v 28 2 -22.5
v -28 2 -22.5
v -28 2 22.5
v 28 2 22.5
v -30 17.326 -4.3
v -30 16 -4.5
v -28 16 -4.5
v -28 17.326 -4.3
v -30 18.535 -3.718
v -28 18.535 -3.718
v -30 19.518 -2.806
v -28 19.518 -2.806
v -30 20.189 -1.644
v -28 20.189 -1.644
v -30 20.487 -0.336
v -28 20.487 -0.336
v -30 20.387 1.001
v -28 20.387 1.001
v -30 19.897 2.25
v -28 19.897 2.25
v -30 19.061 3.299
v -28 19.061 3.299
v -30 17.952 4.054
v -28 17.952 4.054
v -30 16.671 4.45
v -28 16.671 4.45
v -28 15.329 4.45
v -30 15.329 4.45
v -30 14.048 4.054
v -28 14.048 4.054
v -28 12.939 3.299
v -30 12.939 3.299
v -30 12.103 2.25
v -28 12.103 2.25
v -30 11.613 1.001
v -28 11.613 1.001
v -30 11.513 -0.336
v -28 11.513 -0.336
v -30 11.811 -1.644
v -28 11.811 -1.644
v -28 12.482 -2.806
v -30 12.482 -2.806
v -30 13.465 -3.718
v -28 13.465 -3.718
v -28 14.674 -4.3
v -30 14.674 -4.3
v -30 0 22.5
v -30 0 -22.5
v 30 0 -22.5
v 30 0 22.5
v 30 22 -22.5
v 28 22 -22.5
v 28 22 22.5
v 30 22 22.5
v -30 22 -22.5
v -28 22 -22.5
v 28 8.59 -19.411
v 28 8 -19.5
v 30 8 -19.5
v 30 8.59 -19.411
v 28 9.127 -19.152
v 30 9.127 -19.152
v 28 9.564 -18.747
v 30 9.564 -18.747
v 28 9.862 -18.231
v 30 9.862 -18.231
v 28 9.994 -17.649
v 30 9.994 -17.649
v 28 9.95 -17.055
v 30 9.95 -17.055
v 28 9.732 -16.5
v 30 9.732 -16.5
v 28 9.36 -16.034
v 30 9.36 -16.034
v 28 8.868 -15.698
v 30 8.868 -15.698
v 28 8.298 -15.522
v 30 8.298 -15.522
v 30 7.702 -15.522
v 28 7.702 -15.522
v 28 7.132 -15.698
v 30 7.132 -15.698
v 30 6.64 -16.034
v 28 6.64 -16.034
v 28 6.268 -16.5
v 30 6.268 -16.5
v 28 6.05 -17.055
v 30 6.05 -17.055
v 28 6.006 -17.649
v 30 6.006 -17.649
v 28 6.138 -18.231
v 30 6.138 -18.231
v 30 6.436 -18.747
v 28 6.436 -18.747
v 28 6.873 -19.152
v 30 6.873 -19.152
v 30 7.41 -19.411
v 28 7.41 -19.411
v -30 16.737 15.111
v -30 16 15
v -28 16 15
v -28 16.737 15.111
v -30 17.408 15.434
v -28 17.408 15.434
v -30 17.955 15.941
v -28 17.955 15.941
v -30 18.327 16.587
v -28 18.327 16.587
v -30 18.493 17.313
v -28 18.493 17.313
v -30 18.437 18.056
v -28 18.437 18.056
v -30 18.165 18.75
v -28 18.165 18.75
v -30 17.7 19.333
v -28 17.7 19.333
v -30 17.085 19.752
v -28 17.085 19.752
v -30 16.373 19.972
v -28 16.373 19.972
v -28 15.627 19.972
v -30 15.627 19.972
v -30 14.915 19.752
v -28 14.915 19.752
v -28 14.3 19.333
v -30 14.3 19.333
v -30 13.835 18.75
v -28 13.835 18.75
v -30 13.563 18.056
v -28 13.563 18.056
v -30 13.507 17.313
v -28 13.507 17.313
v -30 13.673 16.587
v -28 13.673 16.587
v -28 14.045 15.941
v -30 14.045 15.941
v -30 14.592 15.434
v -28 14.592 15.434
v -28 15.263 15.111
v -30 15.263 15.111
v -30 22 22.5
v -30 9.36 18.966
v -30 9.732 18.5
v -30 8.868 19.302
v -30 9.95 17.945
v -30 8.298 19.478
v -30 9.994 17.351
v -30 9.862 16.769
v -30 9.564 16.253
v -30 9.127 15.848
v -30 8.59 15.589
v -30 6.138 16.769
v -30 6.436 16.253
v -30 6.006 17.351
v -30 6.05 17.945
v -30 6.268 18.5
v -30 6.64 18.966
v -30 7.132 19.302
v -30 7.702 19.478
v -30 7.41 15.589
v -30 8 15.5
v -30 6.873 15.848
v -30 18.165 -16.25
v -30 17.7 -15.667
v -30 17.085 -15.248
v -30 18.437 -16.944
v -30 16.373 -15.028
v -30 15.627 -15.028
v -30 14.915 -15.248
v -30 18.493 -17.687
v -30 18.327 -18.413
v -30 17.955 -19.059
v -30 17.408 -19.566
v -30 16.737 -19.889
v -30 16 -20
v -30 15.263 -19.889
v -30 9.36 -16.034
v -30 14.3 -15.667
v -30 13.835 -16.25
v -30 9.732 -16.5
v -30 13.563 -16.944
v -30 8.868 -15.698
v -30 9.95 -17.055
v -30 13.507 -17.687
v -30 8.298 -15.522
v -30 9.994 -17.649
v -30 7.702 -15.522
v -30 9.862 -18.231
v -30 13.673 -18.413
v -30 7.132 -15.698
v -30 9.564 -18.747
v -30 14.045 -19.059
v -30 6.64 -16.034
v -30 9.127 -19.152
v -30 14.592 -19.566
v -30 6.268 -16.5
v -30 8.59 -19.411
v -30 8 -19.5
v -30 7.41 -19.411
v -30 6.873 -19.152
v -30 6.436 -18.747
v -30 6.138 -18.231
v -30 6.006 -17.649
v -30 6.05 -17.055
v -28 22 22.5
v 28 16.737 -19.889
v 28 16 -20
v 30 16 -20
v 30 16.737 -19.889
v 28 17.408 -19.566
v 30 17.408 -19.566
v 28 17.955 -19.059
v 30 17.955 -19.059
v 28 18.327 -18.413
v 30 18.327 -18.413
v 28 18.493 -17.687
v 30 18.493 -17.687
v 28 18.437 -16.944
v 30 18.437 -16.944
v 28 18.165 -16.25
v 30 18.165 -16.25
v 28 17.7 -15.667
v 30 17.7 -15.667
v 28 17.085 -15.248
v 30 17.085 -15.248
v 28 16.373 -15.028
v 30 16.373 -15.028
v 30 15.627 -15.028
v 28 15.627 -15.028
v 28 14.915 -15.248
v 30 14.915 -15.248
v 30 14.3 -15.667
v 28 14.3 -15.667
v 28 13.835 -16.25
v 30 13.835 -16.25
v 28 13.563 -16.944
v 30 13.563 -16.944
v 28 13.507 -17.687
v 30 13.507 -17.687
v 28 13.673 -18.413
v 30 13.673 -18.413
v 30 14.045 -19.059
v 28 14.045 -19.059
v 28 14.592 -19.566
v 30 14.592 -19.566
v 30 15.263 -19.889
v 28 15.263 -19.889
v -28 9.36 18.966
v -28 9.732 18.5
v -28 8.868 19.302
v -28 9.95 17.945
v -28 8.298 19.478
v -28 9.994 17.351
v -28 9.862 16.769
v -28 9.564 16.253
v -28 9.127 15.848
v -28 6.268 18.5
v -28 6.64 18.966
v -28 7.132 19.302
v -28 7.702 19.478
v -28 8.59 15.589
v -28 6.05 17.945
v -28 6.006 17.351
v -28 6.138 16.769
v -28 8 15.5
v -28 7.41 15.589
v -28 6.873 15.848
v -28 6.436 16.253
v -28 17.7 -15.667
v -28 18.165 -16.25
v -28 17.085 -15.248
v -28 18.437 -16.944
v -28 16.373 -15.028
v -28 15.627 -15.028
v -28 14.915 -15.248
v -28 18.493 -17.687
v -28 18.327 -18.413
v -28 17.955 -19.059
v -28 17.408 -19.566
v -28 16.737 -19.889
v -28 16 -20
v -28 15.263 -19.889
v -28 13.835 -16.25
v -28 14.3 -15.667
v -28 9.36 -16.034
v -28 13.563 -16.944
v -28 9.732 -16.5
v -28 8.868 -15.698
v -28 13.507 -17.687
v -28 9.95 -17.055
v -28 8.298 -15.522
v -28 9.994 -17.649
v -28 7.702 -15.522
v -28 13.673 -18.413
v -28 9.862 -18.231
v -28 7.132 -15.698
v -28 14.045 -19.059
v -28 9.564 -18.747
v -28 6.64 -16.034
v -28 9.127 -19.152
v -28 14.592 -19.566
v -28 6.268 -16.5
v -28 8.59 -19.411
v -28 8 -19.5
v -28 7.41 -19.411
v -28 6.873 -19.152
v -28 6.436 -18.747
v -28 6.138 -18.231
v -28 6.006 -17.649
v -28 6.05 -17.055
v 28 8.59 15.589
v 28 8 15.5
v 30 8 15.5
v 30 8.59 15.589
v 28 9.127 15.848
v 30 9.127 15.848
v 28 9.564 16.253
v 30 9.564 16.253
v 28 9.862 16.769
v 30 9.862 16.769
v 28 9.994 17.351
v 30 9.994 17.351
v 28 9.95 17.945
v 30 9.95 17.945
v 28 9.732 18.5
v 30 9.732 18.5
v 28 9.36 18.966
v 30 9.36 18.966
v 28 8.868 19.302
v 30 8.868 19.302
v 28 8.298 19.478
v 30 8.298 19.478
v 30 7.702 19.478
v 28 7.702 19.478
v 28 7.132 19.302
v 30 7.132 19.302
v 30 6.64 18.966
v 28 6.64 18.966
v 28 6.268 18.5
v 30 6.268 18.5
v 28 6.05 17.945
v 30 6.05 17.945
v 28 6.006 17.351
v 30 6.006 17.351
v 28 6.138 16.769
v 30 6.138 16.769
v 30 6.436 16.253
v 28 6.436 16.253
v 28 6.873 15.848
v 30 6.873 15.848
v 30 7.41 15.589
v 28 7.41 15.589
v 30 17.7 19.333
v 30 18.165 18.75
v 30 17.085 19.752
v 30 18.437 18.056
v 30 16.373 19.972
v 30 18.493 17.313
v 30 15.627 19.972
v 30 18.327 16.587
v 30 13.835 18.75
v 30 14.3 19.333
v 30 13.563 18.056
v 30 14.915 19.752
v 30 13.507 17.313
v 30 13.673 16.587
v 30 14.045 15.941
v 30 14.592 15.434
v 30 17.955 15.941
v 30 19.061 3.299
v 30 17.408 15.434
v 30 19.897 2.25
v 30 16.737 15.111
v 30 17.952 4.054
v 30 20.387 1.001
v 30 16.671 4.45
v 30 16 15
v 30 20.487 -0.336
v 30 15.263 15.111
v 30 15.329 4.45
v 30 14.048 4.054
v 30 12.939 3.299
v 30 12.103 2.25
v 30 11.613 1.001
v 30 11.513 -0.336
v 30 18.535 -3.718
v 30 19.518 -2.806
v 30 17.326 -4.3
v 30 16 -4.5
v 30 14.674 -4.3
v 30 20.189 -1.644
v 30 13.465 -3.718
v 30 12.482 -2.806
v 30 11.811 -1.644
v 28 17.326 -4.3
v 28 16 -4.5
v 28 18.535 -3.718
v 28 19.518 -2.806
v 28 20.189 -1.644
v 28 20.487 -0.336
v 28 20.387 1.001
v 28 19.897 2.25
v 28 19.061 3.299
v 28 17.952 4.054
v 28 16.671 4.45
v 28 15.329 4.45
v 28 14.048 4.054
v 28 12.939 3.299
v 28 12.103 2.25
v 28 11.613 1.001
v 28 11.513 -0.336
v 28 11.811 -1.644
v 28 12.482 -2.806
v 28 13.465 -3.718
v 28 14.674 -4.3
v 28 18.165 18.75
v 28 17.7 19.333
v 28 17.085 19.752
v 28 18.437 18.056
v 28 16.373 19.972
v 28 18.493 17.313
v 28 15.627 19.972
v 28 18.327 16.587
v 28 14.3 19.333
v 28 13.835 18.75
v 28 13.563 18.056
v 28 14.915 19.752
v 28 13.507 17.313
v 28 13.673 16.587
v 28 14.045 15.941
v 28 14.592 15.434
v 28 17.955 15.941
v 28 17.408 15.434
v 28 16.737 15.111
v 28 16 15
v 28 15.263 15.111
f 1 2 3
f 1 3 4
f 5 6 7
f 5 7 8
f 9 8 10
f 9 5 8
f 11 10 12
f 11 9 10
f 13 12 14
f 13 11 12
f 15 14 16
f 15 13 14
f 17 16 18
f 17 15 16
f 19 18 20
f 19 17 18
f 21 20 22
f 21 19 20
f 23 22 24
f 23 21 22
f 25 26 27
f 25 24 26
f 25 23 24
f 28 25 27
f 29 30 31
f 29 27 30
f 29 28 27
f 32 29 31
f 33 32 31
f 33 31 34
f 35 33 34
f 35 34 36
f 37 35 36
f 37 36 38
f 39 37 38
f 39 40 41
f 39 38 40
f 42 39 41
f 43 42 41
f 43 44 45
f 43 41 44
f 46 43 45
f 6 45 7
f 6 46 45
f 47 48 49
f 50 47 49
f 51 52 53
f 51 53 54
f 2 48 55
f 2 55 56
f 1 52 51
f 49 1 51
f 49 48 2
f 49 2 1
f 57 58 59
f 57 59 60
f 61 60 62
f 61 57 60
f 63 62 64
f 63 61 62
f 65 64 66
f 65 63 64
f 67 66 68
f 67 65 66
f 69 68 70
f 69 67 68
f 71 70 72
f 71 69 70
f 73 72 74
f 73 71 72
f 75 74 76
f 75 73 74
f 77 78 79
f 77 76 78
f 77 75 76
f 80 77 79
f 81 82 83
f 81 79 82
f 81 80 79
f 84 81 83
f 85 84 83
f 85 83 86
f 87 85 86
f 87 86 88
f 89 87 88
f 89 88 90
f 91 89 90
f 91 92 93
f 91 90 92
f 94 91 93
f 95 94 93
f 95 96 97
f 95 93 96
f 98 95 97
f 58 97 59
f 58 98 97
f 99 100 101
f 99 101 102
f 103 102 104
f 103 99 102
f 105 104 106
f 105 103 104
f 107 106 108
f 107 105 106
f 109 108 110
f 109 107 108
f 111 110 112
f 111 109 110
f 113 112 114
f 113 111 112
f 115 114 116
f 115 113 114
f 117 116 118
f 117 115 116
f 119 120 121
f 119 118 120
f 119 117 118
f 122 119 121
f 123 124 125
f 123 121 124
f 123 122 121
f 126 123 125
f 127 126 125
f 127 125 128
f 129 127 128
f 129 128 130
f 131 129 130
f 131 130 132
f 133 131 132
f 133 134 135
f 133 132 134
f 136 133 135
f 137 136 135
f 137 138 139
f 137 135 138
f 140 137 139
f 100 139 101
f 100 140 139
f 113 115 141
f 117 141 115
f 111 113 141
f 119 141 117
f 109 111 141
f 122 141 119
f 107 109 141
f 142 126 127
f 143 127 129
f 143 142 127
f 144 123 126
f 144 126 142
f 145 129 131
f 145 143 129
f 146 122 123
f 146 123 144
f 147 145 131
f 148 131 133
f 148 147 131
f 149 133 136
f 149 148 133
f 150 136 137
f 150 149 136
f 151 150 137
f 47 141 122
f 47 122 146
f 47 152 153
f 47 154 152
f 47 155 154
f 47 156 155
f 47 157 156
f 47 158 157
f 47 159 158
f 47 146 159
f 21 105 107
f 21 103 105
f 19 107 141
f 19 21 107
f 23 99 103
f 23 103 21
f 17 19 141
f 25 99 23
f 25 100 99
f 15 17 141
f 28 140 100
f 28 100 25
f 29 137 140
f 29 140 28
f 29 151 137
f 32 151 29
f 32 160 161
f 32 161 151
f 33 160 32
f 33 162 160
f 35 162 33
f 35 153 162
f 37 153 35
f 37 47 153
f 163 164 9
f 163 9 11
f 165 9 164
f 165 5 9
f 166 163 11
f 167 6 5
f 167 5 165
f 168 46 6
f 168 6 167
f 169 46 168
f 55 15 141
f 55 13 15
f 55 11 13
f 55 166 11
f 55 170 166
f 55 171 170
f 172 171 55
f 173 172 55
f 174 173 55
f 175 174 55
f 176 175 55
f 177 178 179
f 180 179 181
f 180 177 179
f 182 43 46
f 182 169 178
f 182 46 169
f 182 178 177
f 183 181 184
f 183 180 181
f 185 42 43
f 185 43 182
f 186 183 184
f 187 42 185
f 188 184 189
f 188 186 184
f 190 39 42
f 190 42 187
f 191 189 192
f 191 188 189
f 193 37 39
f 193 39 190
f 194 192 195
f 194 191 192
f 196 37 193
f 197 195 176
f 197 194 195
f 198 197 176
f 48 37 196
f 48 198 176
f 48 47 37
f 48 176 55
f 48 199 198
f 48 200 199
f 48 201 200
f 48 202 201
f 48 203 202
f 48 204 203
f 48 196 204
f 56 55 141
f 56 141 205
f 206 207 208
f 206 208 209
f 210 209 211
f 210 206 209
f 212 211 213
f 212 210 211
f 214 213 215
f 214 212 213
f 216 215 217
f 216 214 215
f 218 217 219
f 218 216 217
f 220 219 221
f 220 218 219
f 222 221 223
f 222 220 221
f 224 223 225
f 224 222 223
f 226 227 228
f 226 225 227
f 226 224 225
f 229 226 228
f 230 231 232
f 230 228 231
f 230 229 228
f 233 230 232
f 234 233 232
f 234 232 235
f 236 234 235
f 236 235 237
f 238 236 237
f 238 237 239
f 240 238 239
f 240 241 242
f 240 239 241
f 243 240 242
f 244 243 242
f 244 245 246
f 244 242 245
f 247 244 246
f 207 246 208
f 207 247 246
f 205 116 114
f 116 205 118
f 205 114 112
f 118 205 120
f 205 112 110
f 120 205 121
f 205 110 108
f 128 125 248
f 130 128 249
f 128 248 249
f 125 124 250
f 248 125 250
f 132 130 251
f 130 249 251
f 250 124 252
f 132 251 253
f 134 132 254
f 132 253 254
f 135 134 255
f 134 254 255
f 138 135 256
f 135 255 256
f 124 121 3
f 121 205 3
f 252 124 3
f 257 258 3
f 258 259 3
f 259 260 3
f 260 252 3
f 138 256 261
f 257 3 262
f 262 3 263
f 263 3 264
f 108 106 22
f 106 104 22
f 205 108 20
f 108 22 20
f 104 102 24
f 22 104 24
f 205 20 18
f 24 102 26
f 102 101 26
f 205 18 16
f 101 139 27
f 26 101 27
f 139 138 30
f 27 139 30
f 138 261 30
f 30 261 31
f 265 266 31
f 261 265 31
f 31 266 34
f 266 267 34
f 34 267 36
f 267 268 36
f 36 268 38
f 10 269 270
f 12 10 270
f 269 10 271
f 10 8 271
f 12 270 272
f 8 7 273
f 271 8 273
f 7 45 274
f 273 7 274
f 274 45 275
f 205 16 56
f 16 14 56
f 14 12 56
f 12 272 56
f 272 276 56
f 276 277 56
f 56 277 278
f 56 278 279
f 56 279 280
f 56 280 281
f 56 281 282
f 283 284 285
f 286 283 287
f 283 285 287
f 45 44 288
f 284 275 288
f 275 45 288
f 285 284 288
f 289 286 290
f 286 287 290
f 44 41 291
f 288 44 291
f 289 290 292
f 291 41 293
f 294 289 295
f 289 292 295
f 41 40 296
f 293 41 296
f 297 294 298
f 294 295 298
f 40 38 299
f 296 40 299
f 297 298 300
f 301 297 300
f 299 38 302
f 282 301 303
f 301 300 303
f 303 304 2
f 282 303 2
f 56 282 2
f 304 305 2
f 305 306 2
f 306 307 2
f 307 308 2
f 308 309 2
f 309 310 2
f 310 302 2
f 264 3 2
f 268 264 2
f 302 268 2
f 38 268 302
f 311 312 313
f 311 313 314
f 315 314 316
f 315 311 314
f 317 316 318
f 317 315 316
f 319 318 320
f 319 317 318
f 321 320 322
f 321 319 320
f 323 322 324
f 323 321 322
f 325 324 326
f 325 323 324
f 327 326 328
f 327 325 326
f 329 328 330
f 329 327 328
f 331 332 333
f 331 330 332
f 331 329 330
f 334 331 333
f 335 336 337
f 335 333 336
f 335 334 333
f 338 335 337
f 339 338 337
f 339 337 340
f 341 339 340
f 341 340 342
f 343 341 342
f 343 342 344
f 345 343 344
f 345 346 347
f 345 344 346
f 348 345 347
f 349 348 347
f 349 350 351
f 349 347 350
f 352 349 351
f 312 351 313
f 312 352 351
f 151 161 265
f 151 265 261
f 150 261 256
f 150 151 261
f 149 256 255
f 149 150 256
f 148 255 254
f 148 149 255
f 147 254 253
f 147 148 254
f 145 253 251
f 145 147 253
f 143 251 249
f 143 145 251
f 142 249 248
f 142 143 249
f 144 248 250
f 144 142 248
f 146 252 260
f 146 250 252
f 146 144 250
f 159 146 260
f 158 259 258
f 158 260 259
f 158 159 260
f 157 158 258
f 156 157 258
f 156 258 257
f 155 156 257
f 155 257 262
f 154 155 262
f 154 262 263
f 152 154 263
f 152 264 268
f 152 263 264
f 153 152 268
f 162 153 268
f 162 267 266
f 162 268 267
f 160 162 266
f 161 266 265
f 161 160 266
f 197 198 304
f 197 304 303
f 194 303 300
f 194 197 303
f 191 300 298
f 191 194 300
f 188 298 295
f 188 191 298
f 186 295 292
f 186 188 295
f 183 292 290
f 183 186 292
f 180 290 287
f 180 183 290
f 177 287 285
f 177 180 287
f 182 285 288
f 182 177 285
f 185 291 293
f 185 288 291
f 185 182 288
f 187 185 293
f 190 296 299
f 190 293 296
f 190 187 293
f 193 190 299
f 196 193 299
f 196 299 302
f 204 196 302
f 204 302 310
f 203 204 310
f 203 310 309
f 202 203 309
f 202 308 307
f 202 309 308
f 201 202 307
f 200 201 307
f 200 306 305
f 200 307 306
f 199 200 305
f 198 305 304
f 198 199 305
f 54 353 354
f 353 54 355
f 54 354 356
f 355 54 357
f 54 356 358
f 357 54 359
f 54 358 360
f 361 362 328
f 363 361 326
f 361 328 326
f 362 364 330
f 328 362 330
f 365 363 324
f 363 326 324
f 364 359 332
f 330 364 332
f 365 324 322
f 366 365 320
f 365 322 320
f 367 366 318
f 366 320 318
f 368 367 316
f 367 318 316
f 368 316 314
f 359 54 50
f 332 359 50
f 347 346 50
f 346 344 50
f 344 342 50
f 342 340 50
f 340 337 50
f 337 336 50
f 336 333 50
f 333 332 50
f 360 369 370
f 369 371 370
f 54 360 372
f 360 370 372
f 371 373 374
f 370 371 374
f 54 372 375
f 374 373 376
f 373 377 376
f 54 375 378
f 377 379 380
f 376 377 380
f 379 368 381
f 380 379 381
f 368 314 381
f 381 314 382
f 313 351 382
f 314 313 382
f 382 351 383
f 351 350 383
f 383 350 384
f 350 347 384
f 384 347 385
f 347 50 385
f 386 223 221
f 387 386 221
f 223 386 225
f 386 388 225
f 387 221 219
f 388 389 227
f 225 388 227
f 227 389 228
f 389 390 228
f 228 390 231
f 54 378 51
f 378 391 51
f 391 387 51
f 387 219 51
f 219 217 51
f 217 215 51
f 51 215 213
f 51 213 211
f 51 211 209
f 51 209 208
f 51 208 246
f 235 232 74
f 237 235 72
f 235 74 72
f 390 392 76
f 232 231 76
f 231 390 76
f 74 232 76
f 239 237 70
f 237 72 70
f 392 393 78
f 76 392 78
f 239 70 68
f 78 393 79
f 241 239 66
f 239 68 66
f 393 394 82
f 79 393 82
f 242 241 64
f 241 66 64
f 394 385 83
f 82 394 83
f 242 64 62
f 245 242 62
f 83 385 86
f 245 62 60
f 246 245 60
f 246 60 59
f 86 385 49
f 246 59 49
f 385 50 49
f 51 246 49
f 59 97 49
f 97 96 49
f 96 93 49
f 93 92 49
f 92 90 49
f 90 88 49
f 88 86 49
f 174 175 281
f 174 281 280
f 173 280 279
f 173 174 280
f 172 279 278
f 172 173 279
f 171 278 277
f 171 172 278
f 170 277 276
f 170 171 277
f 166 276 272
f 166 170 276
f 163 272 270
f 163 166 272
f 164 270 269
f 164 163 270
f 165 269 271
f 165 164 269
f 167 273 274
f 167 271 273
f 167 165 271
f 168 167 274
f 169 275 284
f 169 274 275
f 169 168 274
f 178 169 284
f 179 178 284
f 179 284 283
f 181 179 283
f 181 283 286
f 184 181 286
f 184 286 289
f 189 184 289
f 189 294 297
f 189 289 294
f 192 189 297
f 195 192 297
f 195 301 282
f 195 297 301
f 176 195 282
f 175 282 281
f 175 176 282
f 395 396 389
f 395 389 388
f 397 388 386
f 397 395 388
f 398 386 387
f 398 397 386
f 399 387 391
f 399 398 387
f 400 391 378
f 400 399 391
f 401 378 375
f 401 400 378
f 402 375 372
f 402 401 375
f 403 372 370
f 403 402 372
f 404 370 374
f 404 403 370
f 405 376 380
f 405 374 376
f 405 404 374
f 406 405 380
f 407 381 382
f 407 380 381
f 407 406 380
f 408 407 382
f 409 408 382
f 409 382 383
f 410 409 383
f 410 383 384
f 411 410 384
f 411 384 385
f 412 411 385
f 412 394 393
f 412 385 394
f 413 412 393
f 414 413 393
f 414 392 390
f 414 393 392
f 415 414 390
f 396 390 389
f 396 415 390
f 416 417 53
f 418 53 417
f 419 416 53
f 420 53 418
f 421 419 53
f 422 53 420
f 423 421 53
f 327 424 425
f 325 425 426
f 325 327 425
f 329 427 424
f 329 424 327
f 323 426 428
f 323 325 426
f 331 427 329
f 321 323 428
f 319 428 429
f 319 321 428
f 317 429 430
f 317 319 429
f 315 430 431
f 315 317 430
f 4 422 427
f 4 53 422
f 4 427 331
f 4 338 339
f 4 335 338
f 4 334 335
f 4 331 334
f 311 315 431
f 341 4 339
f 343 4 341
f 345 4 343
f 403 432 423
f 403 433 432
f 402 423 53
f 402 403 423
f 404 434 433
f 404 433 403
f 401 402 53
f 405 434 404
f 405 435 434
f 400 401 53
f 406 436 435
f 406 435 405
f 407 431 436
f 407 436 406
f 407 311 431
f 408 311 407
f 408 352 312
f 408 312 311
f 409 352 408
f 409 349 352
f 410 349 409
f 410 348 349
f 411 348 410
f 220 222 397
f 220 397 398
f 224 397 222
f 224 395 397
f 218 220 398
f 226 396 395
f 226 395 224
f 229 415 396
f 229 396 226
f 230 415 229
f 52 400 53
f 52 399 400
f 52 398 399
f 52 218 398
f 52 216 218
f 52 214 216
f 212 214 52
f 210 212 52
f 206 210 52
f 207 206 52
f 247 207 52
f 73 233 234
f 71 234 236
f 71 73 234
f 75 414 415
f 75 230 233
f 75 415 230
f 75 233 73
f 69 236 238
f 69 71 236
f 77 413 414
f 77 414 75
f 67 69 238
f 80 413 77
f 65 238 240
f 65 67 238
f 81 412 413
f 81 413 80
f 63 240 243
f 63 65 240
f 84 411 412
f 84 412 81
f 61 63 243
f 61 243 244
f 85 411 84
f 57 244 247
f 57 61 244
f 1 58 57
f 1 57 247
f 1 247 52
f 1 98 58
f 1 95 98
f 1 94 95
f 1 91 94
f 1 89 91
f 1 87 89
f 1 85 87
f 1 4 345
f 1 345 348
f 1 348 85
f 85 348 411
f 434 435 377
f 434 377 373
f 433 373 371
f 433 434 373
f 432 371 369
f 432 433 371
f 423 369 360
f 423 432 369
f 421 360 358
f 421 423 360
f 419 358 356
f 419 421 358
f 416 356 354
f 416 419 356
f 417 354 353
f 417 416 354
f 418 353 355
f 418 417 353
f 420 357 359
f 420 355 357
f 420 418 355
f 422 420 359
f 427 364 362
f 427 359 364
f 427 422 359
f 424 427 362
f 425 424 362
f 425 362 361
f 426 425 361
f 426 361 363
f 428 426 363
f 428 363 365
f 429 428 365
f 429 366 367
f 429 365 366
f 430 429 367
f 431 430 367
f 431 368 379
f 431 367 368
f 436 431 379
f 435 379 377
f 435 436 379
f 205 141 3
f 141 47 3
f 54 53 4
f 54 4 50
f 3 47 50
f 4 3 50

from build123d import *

# Parameters (mm, degrees)
SKETCH1_W               = 60
SKETCH1_H               = 45
BOSS_EXTRUDE1_DEPTH     = 2
SKETCH2_W               = 2
SKETCH2_H               = 45
BOSS_EXTRUDE2_DEPTH     = 20
CUT_EXTRUDE1_DEPTH      = 68.75138375
CUT_EXTRUDE1_DEPTH_BACK = 68.75138375
SKETCH3_R               = 2
SKETCH3_R_2             = 4.5
SKETCH3_R_3             = 2.5


with BuildPart() as part:
    # Sketch1 → Boss-Extrude1 (new body)
    with BuildSketch(Plane(origin=(0, 0, 0), x_dir=(1, 0, 0), z_dir=(0, 1, 0))):
        Rectangle(SKETCH1_W, SKETCH1_H)
    extrude(amount=BOSS_EXTRUDE1_DEPTH)

    # Sketch2 → Boss-Extrude2 (add)
    with BuildSketch(Plane(origin=(0, 2, 0), x_dir=(1, 0, 0), z_dir=(0, 1, 0))):
        with Locations((-29, 0)):
            Rectangle(SKETCH2_W, SKETCH2_H)
        with Locations((29, 0)):
            Rectangle(SKETCH2_W, SKETCH2_H)
    extrude(amount=BOSS_EXTRUDE2_DEPTH)

    # Sketch3 → Cut-Extrude1 (cut, two sides: drawn at the far end of the back side and taken through both)
    with BuildSketch(Plane(origin=(30, 0, 0), x_dir=(0, 0, -1), z_dir=(1, 0, 0)).offset(-CUT_EXTRUDE1_DEPTH_BACK)):
        with Locations((-17.5, 8)):
            Circle(SKETCH3_R)
        with Locations((17.5, 8)):
            Circle(SKETCH3_R)
        with Locations((0, 16)):
            Circle(SKETCH3_R_2)
        with Locations((17.5, 16)):
            Circle(SKETCH3_R_3)
        with Locations((-17.5, 16)):
            Circle(SKETCH3_R_3)
    extrude(amount=CUT_EXTRUDE1_DEPTH + CUT_EXTRUDE1_DEPTH_BACK, mode=Mode.SUBTRACT)


solid = part.part
